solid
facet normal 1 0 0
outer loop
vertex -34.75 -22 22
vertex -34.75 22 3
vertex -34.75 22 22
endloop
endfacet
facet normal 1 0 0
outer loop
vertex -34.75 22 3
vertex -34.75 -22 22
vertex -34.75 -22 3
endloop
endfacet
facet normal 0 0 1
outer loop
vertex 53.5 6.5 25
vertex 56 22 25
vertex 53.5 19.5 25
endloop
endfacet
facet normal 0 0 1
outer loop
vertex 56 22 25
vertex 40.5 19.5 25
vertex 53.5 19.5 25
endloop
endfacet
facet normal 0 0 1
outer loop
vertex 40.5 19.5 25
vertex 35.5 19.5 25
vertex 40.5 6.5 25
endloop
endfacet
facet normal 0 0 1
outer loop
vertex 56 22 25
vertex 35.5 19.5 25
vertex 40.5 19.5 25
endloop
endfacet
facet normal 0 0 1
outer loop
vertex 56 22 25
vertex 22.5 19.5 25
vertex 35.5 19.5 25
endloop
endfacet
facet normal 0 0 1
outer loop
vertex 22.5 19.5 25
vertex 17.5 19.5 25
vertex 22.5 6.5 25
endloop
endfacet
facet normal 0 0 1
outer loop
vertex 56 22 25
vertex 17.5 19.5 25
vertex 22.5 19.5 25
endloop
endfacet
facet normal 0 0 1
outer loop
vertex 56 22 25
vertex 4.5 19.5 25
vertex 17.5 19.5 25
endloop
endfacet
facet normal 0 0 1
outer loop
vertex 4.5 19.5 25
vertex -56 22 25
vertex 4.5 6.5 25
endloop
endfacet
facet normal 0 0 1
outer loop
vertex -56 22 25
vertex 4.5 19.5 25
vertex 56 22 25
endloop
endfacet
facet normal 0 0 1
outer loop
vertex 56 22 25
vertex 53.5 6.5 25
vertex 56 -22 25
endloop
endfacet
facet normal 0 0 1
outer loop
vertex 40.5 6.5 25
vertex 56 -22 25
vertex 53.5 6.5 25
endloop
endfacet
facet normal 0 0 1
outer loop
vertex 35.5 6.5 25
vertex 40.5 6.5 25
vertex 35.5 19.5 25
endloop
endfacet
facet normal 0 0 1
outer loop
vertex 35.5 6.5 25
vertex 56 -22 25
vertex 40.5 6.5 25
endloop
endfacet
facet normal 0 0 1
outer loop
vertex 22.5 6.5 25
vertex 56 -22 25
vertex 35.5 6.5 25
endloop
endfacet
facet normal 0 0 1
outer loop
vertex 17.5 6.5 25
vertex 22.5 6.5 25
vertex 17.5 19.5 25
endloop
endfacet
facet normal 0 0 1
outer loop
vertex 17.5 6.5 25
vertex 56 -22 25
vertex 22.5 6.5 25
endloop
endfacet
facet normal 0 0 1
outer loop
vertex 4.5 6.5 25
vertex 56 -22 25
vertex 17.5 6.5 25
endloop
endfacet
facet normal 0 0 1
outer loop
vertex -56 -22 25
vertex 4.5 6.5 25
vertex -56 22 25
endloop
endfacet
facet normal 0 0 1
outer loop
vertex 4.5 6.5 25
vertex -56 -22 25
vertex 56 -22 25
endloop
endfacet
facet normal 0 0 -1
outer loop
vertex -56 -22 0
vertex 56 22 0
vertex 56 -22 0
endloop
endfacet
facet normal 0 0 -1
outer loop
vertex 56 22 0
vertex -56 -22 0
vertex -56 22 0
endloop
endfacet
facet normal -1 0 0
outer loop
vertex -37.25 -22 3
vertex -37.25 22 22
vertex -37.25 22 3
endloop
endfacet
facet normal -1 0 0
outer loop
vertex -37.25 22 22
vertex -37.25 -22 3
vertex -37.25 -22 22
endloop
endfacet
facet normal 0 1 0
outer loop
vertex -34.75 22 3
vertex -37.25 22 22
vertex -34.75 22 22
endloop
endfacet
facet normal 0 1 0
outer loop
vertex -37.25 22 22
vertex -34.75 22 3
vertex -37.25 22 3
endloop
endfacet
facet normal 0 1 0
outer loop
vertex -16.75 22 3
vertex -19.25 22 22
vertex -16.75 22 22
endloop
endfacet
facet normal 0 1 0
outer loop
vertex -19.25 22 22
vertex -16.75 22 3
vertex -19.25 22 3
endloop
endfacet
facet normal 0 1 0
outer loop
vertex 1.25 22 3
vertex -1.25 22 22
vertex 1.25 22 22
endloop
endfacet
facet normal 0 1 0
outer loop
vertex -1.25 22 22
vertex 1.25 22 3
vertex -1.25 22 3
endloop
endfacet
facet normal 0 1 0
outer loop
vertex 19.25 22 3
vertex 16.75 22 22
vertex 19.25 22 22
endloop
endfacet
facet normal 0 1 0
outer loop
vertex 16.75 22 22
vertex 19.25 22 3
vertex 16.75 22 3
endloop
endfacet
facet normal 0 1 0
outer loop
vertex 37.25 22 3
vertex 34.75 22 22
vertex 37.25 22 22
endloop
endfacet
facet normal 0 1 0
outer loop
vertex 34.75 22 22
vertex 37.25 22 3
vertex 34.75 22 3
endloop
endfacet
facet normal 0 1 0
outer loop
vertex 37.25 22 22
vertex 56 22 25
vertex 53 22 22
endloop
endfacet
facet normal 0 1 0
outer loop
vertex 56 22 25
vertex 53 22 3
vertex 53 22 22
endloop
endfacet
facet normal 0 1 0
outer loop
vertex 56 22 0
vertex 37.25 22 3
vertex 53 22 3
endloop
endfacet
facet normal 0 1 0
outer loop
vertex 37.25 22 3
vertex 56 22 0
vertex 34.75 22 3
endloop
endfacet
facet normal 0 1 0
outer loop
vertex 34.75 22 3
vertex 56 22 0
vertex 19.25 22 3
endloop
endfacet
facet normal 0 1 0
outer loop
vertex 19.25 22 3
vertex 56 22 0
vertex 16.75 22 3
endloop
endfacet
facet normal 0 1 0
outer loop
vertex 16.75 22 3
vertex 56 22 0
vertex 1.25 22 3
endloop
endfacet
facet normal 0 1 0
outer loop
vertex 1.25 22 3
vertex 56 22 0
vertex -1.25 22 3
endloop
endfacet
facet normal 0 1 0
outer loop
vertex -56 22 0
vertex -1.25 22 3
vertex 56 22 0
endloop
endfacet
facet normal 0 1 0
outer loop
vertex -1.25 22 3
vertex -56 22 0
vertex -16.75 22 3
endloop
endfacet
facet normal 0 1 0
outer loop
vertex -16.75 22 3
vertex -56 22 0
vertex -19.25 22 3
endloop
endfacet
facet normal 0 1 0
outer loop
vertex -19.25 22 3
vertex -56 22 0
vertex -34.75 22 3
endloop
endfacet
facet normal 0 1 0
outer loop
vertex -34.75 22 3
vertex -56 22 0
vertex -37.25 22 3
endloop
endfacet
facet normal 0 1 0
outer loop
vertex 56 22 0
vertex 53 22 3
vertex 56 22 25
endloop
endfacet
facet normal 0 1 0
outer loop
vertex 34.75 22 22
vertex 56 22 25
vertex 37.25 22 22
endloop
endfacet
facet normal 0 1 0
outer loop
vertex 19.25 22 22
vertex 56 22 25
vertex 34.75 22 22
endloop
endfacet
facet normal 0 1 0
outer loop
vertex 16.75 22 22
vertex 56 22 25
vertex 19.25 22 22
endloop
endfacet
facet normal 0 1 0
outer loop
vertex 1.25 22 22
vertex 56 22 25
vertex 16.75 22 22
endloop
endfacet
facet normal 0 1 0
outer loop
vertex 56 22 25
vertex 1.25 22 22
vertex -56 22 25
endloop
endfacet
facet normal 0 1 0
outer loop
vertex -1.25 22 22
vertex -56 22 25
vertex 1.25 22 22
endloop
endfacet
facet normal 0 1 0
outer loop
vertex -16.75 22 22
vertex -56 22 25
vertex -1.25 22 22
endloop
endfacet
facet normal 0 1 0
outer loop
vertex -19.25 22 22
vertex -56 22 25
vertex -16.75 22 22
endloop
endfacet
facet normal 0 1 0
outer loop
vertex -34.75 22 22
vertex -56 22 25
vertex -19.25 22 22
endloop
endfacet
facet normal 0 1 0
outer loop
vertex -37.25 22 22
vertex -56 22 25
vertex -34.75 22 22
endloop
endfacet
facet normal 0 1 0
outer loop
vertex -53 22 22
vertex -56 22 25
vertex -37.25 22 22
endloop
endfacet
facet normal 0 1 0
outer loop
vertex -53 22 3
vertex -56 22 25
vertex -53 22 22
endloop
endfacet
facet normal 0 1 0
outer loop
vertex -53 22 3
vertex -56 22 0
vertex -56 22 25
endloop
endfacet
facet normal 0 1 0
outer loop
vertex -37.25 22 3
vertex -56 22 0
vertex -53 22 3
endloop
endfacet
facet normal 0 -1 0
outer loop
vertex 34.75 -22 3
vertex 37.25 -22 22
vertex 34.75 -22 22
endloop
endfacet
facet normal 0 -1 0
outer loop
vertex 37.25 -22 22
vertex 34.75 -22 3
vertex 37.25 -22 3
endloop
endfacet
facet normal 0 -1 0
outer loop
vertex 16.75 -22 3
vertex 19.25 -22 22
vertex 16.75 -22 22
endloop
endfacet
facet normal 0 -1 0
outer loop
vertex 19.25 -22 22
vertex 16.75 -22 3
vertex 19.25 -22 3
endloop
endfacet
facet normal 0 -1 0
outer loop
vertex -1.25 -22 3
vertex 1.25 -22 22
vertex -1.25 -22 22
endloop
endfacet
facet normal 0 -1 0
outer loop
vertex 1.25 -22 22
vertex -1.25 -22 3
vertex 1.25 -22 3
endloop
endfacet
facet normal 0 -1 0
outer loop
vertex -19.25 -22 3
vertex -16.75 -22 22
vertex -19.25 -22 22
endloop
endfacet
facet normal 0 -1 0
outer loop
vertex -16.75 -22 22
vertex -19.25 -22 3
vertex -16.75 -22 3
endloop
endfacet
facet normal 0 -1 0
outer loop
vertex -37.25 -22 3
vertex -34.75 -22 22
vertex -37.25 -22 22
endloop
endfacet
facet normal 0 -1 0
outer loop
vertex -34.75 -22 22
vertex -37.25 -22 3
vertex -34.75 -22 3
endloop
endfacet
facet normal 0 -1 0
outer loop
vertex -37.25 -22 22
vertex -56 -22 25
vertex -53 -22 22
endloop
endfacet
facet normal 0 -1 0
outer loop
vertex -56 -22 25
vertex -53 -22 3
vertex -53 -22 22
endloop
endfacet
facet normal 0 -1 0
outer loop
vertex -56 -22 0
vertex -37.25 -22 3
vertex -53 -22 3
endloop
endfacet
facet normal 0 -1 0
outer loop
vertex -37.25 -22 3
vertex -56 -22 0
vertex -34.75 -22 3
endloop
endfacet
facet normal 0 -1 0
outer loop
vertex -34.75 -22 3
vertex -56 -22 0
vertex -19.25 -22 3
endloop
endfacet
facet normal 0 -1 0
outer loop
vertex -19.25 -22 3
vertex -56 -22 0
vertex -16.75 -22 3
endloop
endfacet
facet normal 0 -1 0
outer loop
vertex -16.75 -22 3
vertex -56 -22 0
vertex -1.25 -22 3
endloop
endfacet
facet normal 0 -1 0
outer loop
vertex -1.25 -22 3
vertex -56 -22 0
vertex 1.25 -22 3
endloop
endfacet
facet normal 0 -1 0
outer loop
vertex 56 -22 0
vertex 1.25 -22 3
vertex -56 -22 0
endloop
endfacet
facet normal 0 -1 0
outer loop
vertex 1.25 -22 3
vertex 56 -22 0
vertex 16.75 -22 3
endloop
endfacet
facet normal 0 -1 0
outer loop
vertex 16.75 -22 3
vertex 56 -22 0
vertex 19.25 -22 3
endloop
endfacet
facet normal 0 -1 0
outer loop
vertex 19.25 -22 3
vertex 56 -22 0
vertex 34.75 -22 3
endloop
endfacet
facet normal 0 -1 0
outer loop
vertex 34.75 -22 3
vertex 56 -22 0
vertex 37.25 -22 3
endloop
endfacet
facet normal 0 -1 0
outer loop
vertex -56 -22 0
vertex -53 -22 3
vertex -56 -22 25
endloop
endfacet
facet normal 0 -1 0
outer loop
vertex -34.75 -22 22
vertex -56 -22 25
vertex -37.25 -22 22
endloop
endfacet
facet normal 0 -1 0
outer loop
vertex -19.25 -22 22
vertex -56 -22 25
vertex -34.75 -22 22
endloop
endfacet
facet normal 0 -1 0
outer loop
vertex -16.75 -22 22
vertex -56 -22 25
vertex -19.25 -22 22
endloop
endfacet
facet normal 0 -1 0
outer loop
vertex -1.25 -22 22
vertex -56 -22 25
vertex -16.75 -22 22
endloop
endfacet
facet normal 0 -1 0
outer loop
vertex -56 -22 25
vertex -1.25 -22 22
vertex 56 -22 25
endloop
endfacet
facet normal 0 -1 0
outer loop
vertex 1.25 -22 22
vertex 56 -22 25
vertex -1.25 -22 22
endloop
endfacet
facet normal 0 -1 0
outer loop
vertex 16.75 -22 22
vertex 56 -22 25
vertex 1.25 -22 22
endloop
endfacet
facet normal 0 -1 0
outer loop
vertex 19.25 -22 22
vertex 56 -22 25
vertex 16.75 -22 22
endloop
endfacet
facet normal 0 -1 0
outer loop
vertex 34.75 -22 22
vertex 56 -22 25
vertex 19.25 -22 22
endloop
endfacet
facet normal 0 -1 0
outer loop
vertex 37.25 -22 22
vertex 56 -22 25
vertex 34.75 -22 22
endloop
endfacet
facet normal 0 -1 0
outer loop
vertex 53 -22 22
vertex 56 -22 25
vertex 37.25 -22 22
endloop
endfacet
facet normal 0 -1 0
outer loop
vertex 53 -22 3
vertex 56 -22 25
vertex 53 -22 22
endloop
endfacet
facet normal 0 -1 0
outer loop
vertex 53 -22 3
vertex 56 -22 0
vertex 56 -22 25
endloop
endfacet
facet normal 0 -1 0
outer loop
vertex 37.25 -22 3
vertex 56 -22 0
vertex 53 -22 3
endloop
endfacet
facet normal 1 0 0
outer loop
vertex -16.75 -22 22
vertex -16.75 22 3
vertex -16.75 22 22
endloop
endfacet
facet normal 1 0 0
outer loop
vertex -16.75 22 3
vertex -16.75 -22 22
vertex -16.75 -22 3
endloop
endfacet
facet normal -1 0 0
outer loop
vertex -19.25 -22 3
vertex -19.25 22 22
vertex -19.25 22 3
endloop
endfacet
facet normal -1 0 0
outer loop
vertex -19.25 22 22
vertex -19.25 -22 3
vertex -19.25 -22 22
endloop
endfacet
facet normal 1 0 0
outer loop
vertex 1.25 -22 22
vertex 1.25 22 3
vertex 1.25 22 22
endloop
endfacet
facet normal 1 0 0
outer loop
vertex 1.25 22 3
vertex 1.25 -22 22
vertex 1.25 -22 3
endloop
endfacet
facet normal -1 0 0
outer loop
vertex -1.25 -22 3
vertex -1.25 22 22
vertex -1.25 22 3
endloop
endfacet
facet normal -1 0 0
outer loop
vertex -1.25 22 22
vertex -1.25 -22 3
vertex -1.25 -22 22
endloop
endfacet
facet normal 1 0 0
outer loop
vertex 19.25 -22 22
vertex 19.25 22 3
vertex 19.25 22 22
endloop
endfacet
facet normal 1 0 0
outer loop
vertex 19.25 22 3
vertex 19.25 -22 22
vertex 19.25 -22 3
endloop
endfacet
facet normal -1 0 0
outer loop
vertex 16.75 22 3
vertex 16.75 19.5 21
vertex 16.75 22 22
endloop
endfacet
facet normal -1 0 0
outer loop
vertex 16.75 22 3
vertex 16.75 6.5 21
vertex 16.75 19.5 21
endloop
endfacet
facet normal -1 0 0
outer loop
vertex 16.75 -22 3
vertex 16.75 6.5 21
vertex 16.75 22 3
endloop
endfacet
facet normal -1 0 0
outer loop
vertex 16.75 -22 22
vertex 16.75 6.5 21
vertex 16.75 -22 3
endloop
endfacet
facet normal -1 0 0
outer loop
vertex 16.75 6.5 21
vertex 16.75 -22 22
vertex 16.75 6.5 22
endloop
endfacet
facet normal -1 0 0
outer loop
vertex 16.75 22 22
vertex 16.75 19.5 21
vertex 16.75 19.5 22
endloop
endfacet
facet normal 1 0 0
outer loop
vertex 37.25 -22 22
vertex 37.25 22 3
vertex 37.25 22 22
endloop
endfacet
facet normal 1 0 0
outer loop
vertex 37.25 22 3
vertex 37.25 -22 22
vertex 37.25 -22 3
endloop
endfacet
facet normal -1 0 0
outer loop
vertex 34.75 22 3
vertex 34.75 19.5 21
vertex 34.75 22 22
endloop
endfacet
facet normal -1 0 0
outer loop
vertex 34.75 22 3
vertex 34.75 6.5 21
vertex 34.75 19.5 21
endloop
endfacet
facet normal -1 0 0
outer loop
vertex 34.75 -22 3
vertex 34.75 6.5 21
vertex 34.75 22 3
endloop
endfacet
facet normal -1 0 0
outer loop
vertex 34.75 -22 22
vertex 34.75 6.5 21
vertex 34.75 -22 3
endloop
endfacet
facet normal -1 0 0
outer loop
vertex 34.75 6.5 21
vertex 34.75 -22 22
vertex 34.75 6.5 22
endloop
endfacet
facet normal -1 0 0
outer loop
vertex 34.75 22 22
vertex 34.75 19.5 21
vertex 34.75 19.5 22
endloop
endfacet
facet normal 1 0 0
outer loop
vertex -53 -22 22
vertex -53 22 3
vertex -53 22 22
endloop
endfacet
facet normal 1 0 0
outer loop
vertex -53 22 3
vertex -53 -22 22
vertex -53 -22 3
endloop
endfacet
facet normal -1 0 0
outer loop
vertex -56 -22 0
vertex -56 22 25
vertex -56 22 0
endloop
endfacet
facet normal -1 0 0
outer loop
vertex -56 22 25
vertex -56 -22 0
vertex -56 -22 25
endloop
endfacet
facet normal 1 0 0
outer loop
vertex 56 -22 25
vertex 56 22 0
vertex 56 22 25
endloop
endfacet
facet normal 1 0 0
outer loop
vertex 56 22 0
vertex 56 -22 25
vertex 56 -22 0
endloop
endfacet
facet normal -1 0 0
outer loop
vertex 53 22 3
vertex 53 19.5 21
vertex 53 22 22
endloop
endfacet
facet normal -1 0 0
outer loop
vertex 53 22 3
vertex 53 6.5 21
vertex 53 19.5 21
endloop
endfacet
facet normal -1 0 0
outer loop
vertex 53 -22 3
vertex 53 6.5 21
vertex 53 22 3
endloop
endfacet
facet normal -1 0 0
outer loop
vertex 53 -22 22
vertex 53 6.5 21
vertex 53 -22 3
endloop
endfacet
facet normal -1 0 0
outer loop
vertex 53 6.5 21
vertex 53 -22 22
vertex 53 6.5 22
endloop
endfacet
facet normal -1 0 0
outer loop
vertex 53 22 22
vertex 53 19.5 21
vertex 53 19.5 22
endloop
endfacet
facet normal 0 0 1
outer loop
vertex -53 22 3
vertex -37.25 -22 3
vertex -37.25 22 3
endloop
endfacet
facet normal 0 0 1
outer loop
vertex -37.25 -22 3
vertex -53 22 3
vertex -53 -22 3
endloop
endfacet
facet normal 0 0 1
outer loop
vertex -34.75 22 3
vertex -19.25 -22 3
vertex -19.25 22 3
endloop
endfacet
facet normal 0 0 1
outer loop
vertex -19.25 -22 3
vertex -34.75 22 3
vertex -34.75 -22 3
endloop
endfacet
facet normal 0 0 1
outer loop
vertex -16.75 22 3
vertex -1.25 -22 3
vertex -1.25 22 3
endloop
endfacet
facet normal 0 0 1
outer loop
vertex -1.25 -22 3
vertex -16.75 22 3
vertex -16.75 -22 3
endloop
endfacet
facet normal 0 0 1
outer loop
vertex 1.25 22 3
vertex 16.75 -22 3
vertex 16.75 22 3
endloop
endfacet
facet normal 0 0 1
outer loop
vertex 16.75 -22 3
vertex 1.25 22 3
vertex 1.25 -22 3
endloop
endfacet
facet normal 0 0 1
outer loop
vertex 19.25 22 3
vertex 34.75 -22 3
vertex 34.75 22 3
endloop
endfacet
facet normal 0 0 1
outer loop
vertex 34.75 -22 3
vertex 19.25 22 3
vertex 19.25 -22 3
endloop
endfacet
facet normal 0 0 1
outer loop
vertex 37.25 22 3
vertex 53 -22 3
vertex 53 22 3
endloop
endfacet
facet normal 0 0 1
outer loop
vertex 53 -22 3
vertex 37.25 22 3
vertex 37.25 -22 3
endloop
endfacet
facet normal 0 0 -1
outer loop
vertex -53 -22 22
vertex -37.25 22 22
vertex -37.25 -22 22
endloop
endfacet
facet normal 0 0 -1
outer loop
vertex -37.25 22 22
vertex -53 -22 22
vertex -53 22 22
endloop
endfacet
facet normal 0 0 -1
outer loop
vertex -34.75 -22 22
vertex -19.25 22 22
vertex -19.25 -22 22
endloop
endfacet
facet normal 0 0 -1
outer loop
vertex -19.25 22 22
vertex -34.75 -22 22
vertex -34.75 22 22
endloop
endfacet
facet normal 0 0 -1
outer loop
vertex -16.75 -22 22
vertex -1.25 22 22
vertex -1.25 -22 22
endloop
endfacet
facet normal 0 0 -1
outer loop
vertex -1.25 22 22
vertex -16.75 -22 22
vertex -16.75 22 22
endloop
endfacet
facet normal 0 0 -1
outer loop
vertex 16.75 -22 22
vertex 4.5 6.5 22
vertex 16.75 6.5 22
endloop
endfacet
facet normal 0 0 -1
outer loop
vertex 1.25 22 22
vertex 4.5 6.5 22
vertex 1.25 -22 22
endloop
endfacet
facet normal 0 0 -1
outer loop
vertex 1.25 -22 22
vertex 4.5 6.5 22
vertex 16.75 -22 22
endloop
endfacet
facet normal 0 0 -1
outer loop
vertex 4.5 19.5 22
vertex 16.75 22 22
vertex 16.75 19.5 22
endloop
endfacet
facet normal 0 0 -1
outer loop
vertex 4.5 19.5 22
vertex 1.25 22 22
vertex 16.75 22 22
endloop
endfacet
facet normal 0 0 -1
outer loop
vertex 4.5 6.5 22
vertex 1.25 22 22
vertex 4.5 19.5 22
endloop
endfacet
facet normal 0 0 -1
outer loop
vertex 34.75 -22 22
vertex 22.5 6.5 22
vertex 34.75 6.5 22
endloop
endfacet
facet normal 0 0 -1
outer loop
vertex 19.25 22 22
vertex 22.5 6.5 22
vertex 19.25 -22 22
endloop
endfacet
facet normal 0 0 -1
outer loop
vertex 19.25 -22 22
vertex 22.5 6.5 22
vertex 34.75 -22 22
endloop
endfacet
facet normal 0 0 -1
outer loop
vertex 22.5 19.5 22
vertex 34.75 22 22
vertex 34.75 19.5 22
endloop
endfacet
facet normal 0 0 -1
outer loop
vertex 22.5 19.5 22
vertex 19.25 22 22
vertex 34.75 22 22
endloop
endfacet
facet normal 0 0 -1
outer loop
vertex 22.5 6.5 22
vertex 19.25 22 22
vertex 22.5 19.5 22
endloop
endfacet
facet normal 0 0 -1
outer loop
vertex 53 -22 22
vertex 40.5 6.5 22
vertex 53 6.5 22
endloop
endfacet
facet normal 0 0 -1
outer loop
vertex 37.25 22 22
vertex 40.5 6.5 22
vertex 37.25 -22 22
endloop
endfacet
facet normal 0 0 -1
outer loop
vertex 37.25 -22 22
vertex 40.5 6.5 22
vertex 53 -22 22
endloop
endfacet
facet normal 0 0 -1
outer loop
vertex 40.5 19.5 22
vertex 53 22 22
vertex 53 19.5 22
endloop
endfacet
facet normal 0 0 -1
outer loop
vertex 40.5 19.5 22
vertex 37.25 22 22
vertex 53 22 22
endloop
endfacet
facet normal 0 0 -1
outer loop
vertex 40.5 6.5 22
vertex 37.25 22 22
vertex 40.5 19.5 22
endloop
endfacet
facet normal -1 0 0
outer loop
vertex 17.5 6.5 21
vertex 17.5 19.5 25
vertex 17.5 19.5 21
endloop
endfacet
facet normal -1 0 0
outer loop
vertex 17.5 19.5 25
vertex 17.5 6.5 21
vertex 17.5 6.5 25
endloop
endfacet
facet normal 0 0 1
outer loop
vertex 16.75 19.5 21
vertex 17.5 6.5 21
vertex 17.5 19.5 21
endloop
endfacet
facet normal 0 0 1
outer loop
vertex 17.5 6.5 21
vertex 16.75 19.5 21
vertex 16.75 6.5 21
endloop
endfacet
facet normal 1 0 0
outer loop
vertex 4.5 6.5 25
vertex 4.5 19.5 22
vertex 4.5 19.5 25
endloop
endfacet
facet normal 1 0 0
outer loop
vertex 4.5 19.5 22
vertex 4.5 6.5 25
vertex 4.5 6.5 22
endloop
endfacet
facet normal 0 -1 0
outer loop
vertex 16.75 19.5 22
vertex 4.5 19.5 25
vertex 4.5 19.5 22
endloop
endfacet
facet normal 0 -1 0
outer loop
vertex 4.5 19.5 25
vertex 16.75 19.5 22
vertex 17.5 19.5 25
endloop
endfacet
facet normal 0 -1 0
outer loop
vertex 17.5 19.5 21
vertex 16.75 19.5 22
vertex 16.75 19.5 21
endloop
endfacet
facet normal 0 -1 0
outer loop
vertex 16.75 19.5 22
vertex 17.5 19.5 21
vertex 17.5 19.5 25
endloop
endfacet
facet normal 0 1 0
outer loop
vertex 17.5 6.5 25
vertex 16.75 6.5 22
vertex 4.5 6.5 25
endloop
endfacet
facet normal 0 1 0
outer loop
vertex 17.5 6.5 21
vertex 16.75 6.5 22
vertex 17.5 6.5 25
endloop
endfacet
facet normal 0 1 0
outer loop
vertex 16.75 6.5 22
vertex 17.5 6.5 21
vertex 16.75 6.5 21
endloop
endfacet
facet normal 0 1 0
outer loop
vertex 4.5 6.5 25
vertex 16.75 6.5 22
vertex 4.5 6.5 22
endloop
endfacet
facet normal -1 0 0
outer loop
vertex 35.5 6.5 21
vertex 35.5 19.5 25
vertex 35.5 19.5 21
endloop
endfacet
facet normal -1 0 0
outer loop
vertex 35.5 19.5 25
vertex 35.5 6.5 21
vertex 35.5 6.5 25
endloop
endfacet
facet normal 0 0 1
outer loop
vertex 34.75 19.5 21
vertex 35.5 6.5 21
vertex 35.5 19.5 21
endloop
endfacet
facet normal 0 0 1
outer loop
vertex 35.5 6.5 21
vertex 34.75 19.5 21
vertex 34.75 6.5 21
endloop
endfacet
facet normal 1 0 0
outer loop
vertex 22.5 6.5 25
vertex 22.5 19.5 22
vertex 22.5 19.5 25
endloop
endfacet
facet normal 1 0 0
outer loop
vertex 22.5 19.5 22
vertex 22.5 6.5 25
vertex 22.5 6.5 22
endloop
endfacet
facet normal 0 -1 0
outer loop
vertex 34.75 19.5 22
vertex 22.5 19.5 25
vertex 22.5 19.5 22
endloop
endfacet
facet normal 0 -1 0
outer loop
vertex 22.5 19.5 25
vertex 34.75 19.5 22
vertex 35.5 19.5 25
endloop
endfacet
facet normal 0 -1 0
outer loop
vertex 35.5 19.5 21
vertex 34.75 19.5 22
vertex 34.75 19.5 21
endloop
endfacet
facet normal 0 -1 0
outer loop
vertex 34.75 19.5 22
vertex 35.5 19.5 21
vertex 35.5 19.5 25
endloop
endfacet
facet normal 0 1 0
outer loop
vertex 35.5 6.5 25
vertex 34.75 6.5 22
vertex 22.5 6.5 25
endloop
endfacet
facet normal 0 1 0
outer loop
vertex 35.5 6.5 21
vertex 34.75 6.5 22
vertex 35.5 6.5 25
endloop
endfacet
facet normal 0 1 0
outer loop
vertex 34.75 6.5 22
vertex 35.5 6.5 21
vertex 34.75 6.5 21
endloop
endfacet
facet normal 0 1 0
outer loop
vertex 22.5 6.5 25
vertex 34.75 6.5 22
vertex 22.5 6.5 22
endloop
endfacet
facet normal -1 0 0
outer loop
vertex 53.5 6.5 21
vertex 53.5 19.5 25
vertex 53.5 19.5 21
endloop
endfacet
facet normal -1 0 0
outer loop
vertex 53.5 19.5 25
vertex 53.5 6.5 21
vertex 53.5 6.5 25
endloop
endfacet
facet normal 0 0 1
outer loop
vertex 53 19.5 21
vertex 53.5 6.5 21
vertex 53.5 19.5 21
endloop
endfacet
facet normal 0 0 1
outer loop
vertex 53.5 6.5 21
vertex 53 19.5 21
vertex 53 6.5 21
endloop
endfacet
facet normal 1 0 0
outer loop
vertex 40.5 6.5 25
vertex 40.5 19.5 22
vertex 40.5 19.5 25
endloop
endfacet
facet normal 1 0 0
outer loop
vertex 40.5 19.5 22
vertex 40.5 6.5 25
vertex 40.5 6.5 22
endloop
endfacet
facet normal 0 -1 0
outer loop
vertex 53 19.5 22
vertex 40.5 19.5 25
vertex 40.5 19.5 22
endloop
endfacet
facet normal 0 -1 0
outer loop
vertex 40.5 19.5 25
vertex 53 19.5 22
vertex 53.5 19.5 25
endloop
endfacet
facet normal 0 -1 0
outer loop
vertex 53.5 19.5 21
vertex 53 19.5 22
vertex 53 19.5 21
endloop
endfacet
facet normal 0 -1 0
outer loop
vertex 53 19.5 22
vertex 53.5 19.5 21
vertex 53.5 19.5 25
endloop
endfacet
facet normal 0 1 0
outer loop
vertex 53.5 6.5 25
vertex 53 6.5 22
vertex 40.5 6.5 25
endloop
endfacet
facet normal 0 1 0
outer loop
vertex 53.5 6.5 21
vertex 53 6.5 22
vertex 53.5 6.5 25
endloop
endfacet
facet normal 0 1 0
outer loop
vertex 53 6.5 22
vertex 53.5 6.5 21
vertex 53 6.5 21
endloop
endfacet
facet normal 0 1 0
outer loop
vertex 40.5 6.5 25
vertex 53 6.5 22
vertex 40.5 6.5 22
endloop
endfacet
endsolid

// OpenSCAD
// --- Dimensions ---
base_width_x = 112;       // Total width of the base plate (X)
base_depth_y = 44;        // Total depth of the base plate (Y)
base_thickness = 3;       // Thickness of the base plate (Z)

deck_width_x = 112;       // Total width of the deck plate (X)
deck_depth_y = 44;        // Total depth of the deck plate (Y)
deck_z_start = 22;        // Z-coordinate where the deck starts
deck_thickness = 3;       // Thickness of the deck plate (Z)

end_wall_thickness = 3;   // Thickness of the two end walls
rib_thickness = 2.5;      // Thickness of the five internal ribs
wall_height = 25;         // Total height of the upright walls (Z)

// Hole dimensions (for 12.5mm cuvettes)
hole_size = 13;           // Width and depth of the square holes
hole_spacing_x = 18;      // Center-to-center spacing along X
hole_spacing_y = 18;      // Center-to-center spacing along Y
rows = 2;                 // Number of rows along Y
cols = 6;                 // Number of columns along X

/* [Render Settings] */
$fn = 64;

// --- Main Assembly ---

// We use a union of all solid parts, then subtract the holes from the whole.
difference() {
    union() {
        // 1. The Base Plate
        // Positioned to sit on the bed from z=0 to z=3
        translate([0, 0, base_thickness/2])
            cube([base_width_x, base_depth_y, base_thickness], center = true);

        // 2. The Deck Plate
        // Positioned to sit from z=22 to z=25
        translate([0, 0, deck_z_start + deck_thickness/2])
            cube([deck_width_x, deck_depth_y, deck_thickness], center = true);

        // 3. The Upright Walls (End walls and Ribs)
        // These run from z=0 to z=25
        // We use a union to combine all vertical elements
        union() {
            // Two End Walls
            // Flush with short ends (X = +/- 56)
            // To be flush with the 112mm edge, the center is at +/- (56 - 1.5)
            translate([-(base_width_x/2 - end_wall_thickness/2), 0, wall_height/2])
                cube([end_wall_thickness, base_depth_y, wall_height], center = true);
            
            translate([(base_width_x/2 - end_wall_thickness/2), 0, wall_height/2])
                cube([end_wall_thickness, base_depth_y, wall_height], center = true);

            // Five Ribs
            // Rib positions: -36, -18, 0, 18, 36
            rib_positions_x = [-36, -18, 0, 18, 36];
            for (rx = rib_positions_x) {
                translate([rx, 0, wall_height/2])
                    cube([rib_thickness, base_depth_y, wall_height], center = true);
            }
        }
    }

    // 4. The 12 Square Through-Holes
    // Holes are cut through the deck plate (z=22 to z=25)
    // We make the cutter taller than the deck to ensure a clean cut.
    
    // Calculate starting offset to center the grid on the deck
    // Grid width = (cols-1)*spacing_x = 5 * 18 = 90
    // Grid height = (rows-1)*spacing_y = 1 * 18 = 18
    offset_x = (deck_width_x - (cols - 1) * hole_spacing_x) / 2;
    offset_y = (deck_depth_y - (rows - 1) * hole_spacing_y) / 2;

    // The cutter is centered on the deck's Z center (23.5)
    // and extends past the deck's top and bottom.
    translate([0, 0, deck_z_start + deck_thickness/2])
    for (i = [0 : cols - 1]) {
        for (j = [0 : rows - 1]) {
            translate([
                offset_x + i * hole_spacing_x, 
                offset_y + j * hole_spacing_y, 
                0
            ])
            cube([hole_size, hole_size, deck_thickness + 2], center = true);
        }
    }
}
